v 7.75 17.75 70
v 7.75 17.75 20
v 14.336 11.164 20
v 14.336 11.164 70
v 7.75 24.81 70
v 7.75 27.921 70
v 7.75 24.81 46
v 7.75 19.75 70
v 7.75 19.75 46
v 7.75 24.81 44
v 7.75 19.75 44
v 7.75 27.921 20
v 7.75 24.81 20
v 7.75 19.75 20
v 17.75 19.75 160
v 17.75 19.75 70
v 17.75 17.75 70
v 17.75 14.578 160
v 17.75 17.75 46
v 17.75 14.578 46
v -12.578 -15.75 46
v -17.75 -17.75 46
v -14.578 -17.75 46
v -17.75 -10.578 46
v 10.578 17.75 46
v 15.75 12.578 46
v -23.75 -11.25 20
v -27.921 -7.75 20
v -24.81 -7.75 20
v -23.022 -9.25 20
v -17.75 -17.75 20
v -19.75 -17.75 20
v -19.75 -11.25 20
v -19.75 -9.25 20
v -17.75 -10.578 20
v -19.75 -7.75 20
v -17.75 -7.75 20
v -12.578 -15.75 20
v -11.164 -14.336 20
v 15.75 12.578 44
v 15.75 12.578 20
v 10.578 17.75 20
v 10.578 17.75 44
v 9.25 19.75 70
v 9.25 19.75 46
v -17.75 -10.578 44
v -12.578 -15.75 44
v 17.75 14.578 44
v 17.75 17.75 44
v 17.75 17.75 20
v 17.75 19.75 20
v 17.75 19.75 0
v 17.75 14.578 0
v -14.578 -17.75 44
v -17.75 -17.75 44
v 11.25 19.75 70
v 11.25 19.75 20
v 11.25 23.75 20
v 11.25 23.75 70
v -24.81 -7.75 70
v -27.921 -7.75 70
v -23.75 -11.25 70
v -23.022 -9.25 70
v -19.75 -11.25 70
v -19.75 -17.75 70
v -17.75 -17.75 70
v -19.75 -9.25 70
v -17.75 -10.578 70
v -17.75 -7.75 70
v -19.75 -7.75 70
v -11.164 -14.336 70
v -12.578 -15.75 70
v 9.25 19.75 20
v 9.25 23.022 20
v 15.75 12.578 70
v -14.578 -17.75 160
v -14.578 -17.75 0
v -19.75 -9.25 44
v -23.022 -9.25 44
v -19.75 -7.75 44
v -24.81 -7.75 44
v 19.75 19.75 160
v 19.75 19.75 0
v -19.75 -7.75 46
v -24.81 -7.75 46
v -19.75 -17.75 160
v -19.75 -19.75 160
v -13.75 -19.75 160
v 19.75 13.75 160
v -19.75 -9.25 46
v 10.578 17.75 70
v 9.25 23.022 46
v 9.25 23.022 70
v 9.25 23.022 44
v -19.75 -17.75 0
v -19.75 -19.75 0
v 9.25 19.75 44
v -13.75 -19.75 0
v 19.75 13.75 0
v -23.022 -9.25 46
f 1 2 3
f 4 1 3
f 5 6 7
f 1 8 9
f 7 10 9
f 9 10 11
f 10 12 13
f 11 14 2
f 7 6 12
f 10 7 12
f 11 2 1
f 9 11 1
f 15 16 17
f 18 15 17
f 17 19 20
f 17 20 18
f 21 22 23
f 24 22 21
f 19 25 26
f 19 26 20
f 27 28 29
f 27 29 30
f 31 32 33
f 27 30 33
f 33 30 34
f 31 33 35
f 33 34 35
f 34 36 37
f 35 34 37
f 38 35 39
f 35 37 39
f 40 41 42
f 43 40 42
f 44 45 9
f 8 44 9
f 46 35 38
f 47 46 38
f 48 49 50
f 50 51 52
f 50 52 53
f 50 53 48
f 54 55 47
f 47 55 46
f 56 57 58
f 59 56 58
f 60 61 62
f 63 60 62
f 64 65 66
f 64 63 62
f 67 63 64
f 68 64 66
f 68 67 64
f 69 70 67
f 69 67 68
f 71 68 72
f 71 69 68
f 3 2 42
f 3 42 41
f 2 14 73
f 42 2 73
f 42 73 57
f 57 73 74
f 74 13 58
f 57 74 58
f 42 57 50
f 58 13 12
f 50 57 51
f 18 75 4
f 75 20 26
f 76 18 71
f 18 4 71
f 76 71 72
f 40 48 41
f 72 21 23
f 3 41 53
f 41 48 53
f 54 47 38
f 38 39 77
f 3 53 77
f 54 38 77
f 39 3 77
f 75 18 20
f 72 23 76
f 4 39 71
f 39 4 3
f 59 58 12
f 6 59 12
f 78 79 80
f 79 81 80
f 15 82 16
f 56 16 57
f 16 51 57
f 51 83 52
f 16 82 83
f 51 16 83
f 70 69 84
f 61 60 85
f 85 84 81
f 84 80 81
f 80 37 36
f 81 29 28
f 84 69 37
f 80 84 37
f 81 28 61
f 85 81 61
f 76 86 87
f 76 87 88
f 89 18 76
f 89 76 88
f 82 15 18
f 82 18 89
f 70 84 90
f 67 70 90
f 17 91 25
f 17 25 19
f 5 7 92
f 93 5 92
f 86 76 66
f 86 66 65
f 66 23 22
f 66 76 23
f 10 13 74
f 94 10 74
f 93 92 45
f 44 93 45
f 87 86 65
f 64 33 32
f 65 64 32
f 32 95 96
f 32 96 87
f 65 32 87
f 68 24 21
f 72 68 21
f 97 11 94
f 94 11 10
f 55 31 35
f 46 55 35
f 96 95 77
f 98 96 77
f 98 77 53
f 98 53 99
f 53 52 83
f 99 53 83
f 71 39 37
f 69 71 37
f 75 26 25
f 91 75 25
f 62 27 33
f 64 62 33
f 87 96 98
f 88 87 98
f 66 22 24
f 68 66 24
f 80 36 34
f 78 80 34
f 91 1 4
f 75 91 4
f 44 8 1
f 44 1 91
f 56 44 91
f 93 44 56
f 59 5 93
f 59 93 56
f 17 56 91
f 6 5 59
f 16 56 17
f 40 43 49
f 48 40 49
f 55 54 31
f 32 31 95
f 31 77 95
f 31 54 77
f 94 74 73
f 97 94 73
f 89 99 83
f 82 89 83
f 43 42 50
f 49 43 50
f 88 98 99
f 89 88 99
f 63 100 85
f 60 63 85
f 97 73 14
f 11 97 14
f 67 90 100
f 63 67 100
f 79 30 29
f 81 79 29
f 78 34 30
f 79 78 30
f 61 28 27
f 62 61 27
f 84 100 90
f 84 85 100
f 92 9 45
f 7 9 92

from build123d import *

# Parameters (mm, degrees)
F1_DEPTH = 20
F3_DEPTH = 50
F5_DEPTH = 90
F8_DEPTH = 1


with BuildPart() as f1:
    # F0 (on Top) → F1 (new body)
    with BuildSketch(Plane.XY):
        Polygon((-19.75, -17.7500005811), (-19.75, -19.75), (-13.75, -19.75), (19.75, 13.75), (19.75, 19.75), (17.7500005811, 19.75), (17.7500005811, 14.578426884), (-14.578426884, -17.7500005811), align=None)
    extrude(amount=F1_DEPTH)

    # F2 (on face) → F3 (join)
    with BuildSketch(Plane.XY.offset(20)):
        Polygon((-19.75, -19.75), (-13.75, -19.75), (19.75, 13.75), (19.75, 19.75), (11.25, 19.75), (11.25, 23.75), (7.75, 27.9211375741), (7.75, 24.8096899204), (9.25, 23.0220595315), (9.25, 19.75), (7.75, 19.75), (7.75, 17.7500005811), (14.3357871391, 11.164213442), (-11.164213442, -14.3357871391), (-17.7500005811, -7.75), (-19.75, -7.75), (-19.75, -9.25), (-23.0220595315, -9.25), (-24.8096899204, -7.75), (-27.9211375741, -7.75), (-23.75, -11.25), (-19.75, -11.25), align=None)
        Polygon((-17.7500005811, -17.7500005811), (-17.7500005811, -10.5784263029), (-12.5784265935, -15.7500002906), (-14.578426884, -17.7500005811), align=None, mode=Mode.SUBTRACT)
        Polygon((10.5784263029, 17.7500005811), (17.7500005811, 17.7500005811), (17.7500005811, 14.578426884), (15.7500002906, 12.5784265935), align=None, mode=Mode.SUBTRACT)
    extrude(amount=F3_DEPTH)

    # F4 (on face) → F5 (join)
    with BuildSketch(Plane.XY.offset(70)):
        Polygon((19.75, 13.75), (19.75, 19.75), (17.7500005811, 19.75), (17.7500005811, 14.578426884), (-14.578426884, -17.7500005811), (-19.75, -17.7500005811), (-19.75, -19.75), (-13.75, -19.75), align=None)
    extrude(amount=F5_DEPTH)

    # F7 (on mid) → F8 (join, symmetric)
    with BuildSketch(Plane.XY.offset(45)):
        Polygon((-23.0220595315, -9.25), (-19.75, -9.25), (-19.75, -7.75), (-24.8096899204, -7.75), align=None)
        Polygon((7.75, 19.75), (9.25, 19.75), (9.25, 23.0220595315), (7.75, 24.8096899204), align=None)
        Polygon((17.7500005811, 14.578426884), (17.7500005811, 17.7500005811), (10.5784263029, 17.7500005811), (15.7500002906, 12.5784265935), align=None)
        Polygon((-12.5784265935, -15.7500002906), (-17.7500005811, -10.5784263029), (-17.7500005811, -17.7500005811), (-14.578426884, -17.7500005811), align=None)
    extrude(amount=F8_DEPTH, both=True)


solid = f1.part
